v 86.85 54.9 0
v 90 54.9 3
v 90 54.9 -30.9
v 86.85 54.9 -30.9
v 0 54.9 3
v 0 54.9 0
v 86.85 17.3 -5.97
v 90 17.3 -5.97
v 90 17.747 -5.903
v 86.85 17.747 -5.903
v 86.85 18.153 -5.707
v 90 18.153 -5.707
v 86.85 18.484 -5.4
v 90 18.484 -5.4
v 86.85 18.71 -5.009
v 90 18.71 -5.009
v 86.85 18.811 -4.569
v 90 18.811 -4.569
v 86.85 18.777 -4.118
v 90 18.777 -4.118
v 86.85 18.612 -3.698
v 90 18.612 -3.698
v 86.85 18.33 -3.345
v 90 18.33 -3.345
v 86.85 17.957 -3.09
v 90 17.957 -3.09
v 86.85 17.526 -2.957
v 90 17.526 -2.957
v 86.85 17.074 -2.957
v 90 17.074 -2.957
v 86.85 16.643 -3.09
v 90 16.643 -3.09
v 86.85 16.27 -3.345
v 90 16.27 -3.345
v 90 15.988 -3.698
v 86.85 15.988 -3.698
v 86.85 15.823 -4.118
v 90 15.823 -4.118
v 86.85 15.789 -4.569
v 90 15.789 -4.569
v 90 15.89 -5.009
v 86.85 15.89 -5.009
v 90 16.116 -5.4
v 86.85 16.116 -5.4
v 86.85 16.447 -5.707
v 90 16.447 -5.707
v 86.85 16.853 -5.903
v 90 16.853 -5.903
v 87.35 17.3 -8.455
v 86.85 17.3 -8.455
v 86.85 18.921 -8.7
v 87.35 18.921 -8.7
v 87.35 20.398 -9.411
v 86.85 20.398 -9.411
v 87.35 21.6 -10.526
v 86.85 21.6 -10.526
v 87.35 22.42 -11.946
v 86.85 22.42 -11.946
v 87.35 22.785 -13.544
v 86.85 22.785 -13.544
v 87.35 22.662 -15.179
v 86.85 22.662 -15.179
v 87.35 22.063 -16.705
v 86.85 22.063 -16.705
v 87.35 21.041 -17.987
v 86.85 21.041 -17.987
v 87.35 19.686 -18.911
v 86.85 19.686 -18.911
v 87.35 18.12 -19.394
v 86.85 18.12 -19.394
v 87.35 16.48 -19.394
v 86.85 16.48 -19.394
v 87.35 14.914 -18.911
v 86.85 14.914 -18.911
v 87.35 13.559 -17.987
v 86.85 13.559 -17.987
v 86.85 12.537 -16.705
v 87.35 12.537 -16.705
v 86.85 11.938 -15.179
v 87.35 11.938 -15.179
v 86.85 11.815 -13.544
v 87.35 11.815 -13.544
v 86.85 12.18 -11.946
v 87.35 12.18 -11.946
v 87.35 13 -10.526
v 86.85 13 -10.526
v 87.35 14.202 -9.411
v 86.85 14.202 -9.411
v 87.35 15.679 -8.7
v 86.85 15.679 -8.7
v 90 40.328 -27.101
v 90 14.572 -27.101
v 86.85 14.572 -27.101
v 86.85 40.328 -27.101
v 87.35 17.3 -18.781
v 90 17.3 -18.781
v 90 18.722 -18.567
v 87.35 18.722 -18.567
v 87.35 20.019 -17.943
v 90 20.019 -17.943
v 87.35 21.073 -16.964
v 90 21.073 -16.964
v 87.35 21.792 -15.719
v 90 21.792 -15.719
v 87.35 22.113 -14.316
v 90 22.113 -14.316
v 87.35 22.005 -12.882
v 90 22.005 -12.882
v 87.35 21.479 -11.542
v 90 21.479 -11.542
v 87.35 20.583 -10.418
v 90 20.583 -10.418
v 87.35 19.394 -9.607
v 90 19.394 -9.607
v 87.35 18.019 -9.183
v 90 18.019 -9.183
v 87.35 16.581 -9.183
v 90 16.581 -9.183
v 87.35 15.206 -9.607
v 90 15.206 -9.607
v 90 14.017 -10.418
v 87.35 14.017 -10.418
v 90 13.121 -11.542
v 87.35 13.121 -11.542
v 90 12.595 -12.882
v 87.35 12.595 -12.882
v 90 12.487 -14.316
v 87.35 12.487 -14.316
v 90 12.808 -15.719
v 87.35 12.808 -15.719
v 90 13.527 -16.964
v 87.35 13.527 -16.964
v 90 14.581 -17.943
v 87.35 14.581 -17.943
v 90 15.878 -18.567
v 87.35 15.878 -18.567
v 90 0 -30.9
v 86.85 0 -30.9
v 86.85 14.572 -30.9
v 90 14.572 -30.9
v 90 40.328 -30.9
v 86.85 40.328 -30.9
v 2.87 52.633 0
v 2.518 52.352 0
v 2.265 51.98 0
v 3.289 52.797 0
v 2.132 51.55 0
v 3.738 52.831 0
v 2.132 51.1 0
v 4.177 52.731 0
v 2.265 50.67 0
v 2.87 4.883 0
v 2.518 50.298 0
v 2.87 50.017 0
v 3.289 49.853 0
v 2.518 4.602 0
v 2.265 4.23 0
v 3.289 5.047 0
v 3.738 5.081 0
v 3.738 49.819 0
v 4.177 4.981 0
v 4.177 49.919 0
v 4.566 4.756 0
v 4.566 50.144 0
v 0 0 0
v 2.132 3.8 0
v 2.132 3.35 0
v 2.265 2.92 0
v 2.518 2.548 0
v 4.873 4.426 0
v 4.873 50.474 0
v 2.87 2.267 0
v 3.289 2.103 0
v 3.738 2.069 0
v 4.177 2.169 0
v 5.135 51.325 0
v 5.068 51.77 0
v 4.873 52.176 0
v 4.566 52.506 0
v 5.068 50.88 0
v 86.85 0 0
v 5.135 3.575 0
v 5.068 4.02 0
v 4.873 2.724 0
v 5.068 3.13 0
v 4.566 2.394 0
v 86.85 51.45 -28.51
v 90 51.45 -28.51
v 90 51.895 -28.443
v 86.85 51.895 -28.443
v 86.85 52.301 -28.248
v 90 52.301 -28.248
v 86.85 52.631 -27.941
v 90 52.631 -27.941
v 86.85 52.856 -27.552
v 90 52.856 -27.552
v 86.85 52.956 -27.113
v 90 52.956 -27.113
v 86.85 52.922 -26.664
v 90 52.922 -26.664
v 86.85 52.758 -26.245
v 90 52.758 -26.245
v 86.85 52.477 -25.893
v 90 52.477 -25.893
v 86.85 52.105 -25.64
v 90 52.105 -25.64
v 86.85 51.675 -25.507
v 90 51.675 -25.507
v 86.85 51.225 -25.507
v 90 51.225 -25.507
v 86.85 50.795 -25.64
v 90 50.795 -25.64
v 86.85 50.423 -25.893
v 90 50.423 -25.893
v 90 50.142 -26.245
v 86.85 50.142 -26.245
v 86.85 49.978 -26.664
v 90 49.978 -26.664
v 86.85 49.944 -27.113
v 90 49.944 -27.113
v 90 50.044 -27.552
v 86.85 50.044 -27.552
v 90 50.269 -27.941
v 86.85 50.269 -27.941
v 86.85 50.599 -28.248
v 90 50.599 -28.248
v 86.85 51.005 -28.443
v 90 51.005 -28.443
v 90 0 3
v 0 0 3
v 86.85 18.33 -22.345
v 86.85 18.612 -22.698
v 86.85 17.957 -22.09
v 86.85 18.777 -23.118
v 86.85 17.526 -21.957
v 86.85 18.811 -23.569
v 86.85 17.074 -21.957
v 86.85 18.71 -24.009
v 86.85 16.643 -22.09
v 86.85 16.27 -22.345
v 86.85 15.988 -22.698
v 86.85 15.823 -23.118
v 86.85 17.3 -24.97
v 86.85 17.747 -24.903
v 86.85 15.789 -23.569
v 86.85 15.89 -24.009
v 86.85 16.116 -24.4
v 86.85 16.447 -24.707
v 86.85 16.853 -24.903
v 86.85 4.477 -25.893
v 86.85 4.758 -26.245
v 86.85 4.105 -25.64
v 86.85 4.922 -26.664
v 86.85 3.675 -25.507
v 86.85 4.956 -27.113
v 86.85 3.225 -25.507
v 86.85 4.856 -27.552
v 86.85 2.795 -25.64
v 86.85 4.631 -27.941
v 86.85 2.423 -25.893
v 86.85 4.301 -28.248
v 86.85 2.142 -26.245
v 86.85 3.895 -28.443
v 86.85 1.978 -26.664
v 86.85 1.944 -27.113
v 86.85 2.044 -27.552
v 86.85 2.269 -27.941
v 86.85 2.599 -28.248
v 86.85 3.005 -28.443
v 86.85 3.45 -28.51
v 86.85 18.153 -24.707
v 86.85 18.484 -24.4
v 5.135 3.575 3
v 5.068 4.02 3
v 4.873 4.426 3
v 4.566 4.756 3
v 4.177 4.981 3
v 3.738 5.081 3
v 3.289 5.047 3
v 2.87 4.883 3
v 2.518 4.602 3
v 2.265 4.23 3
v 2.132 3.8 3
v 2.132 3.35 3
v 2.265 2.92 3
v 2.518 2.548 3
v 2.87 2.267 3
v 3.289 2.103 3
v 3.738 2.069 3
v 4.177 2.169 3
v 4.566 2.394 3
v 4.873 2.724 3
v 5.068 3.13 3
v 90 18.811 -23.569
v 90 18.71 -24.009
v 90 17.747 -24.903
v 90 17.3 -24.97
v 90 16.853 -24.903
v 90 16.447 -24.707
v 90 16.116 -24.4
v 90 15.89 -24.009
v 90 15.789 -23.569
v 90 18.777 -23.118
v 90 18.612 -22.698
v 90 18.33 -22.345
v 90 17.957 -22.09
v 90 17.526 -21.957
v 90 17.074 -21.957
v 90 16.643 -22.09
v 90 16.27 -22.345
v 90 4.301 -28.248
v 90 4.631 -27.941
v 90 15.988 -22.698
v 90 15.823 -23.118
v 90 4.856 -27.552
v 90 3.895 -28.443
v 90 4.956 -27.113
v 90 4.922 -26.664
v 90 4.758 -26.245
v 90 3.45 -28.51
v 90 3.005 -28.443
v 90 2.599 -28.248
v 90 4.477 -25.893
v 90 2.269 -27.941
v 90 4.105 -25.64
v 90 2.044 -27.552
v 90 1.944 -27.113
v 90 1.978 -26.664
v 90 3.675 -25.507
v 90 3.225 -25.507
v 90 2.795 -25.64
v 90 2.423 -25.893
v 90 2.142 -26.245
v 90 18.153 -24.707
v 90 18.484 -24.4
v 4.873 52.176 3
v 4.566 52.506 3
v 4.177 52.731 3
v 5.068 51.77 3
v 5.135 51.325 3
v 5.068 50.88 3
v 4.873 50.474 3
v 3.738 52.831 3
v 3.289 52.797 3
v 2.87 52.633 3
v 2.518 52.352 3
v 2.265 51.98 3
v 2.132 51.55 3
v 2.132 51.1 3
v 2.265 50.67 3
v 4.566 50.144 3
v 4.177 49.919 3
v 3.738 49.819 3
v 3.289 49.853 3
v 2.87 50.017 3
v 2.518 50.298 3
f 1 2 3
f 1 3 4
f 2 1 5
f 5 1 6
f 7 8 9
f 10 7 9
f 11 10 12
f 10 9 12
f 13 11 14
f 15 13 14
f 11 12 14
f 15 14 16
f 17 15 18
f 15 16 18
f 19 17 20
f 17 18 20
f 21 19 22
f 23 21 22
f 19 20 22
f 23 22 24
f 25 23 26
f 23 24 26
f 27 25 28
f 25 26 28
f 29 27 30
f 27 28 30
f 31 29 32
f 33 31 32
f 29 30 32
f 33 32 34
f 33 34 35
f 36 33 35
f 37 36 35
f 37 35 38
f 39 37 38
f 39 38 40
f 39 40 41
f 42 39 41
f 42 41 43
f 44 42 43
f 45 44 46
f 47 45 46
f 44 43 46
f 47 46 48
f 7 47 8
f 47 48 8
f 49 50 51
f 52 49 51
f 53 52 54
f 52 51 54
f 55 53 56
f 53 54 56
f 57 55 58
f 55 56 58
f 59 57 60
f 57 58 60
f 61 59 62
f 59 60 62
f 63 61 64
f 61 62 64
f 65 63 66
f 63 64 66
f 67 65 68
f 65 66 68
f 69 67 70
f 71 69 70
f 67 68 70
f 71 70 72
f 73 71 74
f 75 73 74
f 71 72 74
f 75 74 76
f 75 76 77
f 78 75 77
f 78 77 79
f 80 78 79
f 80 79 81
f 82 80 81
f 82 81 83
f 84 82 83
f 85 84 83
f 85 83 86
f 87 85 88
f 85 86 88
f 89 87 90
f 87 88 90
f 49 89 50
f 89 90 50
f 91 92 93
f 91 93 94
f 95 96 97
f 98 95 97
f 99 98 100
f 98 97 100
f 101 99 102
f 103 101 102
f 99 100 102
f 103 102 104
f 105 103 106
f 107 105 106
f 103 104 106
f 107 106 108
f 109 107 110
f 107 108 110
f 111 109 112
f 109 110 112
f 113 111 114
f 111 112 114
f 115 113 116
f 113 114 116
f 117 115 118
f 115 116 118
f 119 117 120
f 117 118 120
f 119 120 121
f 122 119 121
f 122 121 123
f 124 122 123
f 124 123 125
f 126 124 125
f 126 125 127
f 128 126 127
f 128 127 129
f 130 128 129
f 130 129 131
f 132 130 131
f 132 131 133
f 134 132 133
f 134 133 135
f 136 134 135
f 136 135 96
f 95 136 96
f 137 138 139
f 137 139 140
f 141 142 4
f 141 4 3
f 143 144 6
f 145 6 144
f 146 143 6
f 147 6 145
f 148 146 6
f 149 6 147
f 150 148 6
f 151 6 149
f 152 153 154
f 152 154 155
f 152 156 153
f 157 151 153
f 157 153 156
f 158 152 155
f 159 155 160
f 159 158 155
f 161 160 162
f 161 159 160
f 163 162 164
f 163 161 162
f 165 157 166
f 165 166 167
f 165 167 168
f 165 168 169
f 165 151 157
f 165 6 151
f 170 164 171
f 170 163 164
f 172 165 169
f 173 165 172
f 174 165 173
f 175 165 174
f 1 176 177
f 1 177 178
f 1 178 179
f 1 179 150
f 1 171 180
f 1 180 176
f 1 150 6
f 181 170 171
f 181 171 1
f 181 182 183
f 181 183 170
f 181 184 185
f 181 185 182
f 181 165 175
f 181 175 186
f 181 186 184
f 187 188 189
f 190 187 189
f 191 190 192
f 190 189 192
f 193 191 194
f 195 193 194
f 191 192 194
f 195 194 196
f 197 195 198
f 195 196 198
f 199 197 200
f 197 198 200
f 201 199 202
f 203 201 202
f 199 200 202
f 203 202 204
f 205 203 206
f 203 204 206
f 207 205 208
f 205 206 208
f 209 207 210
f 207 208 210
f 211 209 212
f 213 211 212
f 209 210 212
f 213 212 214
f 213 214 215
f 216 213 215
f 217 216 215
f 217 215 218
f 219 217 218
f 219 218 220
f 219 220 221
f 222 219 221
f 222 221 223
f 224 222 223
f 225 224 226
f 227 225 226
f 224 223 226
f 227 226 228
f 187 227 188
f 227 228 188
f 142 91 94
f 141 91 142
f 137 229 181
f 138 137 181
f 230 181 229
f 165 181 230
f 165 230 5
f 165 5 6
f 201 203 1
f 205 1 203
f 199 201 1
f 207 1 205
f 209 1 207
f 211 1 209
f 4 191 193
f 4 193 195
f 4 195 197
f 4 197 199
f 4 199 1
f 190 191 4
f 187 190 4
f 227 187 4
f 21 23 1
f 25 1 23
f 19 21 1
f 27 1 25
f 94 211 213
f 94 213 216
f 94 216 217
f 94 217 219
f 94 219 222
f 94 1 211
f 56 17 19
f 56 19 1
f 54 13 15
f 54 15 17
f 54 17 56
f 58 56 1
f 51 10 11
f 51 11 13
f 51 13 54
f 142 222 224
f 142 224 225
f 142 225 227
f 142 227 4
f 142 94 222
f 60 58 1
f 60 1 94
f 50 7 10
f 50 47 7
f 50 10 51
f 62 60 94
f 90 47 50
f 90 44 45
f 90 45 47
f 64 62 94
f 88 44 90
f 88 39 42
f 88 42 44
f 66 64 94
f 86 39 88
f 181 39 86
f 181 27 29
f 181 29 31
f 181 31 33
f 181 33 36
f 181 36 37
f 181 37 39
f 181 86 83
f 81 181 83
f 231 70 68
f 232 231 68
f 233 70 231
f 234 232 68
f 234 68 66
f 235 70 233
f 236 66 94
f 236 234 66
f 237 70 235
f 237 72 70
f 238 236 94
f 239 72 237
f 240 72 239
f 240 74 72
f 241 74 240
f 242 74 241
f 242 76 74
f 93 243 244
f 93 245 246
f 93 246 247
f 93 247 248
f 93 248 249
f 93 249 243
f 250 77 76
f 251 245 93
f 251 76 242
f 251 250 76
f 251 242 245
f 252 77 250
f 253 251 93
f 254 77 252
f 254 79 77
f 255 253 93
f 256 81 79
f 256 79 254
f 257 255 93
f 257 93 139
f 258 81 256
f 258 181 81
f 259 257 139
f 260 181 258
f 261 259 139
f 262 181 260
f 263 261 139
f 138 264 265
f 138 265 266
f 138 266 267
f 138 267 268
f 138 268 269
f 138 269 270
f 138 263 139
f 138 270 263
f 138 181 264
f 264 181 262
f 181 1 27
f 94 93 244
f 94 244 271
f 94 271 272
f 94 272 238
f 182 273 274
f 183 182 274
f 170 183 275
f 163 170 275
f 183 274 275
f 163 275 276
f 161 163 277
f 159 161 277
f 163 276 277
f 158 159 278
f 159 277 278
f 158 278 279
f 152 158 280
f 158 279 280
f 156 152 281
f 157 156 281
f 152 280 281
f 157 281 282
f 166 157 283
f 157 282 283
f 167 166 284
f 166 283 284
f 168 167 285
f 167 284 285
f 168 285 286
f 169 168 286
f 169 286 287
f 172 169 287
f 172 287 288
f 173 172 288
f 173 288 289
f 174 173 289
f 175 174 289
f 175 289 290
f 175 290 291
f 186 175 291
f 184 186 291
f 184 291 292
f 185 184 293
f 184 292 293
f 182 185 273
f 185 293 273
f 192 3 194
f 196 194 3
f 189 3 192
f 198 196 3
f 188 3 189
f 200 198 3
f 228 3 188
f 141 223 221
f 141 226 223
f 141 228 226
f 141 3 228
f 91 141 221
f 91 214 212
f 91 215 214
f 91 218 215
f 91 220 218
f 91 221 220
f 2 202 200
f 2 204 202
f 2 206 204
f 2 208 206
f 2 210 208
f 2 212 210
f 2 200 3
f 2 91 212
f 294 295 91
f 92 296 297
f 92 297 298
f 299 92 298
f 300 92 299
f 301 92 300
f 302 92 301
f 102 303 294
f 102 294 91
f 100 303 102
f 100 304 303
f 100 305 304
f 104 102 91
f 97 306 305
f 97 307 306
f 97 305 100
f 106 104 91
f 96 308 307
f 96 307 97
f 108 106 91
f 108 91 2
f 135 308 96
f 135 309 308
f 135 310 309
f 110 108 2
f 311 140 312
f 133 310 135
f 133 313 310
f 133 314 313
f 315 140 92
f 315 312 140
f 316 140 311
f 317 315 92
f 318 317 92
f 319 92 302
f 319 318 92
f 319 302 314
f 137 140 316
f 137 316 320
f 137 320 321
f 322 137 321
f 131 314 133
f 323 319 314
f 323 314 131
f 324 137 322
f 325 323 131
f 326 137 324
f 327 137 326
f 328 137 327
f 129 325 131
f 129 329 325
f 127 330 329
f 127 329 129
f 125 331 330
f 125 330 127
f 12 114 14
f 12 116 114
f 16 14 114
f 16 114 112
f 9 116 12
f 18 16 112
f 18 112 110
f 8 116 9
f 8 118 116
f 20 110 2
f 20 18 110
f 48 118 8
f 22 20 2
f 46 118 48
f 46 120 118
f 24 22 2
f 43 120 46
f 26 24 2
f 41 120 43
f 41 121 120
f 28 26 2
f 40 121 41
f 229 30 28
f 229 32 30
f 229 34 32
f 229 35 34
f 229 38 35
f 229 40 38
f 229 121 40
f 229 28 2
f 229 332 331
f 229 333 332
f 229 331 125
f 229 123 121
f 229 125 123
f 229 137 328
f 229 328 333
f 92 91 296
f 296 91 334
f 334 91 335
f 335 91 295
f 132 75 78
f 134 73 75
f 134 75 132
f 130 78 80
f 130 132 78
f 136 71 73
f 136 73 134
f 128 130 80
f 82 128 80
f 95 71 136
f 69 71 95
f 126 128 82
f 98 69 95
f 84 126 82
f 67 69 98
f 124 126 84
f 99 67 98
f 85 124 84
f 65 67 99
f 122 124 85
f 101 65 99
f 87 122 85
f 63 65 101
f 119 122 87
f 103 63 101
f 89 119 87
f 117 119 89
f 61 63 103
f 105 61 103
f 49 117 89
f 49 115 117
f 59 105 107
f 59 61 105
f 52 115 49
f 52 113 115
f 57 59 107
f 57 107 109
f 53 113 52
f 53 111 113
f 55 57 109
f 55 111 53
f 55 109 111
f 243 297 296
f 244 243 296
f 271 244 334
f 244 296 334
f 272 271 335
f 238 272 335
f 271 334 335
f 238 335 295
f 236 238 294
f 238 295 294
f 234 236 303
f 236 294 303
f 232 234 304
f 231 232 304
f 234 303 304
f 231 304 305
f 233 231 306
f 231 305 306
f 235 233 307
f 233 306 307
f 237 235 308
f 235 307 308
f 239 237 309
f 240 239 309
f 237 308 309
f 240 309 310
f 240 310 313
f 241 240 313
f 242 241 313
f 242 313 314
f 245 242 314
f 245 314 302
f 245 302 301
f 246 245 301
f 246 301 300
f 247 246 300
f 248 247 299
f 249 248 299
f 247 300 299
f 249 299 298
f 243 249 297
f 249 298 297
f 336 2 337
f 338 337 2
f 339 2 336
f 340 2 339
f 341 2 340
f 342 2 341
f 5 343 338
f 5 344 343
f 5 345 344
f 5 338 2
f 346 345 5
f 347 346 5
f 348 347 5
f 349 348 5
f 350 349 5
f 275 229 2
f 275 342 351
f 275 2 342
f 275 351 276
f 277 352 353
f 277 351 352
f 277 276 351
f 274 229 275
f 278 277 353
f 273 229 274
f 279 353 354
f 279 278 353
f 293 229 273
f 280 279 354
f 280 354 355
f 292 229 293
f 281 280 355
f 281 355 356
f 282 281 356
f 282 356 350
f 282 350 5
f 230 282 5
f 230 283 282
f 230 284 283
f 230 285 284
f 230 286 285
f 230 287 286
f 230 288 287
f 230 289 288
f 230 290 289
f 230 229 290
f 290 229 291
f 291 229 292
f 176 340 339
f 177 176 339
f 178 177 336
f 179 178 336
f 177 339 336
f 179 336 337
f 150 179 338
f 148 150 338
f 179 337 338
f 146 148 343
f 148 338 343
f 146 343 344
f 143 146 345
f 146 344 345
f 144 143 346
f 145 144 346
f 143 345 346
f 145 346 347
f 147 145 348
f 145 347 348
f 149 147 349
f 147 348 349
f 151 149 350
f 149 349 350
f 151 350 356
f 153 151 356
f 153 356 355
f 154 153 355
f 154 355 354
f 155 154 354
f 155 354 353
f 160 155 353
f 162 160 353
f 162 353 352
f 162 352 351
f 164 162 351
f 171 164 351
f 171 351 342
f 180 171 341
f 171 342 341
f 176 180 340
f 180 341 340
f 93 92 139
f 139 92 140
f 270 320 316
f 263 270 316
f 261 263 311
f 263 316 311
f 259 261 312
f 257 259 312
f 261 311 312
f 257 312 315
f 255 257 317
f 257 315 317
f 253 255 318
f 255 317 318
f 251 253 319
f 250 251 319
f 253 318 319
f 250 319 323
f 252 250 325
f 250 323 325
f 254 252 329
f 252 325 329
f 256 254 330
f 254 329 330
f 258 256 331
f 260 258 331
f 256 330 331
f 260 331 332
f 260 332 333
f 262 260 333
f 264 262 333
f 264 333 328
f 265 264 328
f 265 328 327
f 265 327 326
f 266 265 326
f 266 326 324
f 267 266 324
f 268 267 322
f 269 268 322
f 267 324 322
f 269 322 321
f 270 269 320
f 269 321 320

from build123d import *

# Parameters (mm, degrees)
BOSS_EXTRUDE1_DEPTH = 54.9
SKETCH2_R           = 1.51
CUT_EXTRUDE1_DEPTH  = 3.15
SKETCH3_R           = 1.51
CUT_EXTRUDE2_DEPTH  = 3
SKETCH4_R           = 4.826
SKETCH4_R_2         = 1.515
CUT_EXTRUDE3_DEPTH  = 3.15
SKETCH6_R           = 5.5
CUT_EXTRUDE5_DEPTH  = 0.5
SKETCH8_W           = 3.798879325
SKETCH8_H           = 25.75548204
CUT_EXTRUDE7_DEPTH  = 3.15


with BuildPart() as part:
    # Sketch1 → Boss-Extrude1 (new body)
    with BuildSketch(Plane(origin=(0, 0, 0), x_dir=(1, 0, 0), z_dir=(0, 1, 0))):
        Polygon((0, 0), (86.85, 0), (86.85, 30.9), (90, 30.9), (90, -3), (0, -3), align=None)
    extrude(amount=BOSS_EXTRUDE1_DEPTH)

    # Sketch2 → Cut-Extrude1 (cut)
    with BuildSketch(Plane(origin=(90, 0, 0), x_dir=(0, 0, -1), z_dir=(1, 0, 0))):
        with Locations((27, 51.45)):
            Circle(SKETCH2_R)
        with Locations((27, 3.45)):
            Circle(SKETCH2_R)
    extrude(amount=-CUT_EXTRUDE1_DEPTH, mode=Mode.SUBTRACT)

    # Sketch3 → Cut-Extrude2 (cut)
    with BuildSketch(Plane.XY.offset(3)):
        with Locations((3.625, 51.325)):
            Circle(SKETCH3_R)
        with Locations((3.625, 3.575)):
            Circle(SKETCH3_R)
    extrude(amount=-CUT_EXTRUDE2_DEPTH, mode=Mode.SUBTRACT)

    # Sketch4 → Cut-Extrude3 (cut)
    with BuildSketch(Plane(origin=(90, 0, 0), x_dir=(0, 0, -1), z_dir=(1, 0, 0))):
        with Locations((13.95544469, 17.3)):
            Circle(SKETCH4_R)
        with Locations((23.45544469, 17.3)):
            Circle(SKETCH4_R_2)
        with Locations((4.45544469, 17.3)):
            Circle(SKETCH4_R_2)
    extrude(amount=-CUT_EXTRUDE3_DEPTH, mode=Mode.SUBTRACT)

    # Sketch6 → Cut-Extrude5 (cut)
    with BuildSketch(Plane.ZY.offset(-86.85)):
        with Locations((-13.95544469, 17.3)):
            Circle(SKETCH6_R)
    extrude(amount=-CUT_EXTRUDE5_DEPTH, mode=Mode.SUBTRACT)

    # Sketch8 → Cut-Extrude7 (cut)
    with BuildSketch(Plane(origin=(90, 0, 0), x_dir=(0, 0, -1), z_dir=(1, 0, 0))):
        with Locations((29.000560338, 27.45)):
            Rectangle(SKETCH8_W, SKETCH8_H)
    extrude(amount=-CUT_EXTRUDE7_DEPTH, mode=Mode.SUBTRACT)


solid = part.part
